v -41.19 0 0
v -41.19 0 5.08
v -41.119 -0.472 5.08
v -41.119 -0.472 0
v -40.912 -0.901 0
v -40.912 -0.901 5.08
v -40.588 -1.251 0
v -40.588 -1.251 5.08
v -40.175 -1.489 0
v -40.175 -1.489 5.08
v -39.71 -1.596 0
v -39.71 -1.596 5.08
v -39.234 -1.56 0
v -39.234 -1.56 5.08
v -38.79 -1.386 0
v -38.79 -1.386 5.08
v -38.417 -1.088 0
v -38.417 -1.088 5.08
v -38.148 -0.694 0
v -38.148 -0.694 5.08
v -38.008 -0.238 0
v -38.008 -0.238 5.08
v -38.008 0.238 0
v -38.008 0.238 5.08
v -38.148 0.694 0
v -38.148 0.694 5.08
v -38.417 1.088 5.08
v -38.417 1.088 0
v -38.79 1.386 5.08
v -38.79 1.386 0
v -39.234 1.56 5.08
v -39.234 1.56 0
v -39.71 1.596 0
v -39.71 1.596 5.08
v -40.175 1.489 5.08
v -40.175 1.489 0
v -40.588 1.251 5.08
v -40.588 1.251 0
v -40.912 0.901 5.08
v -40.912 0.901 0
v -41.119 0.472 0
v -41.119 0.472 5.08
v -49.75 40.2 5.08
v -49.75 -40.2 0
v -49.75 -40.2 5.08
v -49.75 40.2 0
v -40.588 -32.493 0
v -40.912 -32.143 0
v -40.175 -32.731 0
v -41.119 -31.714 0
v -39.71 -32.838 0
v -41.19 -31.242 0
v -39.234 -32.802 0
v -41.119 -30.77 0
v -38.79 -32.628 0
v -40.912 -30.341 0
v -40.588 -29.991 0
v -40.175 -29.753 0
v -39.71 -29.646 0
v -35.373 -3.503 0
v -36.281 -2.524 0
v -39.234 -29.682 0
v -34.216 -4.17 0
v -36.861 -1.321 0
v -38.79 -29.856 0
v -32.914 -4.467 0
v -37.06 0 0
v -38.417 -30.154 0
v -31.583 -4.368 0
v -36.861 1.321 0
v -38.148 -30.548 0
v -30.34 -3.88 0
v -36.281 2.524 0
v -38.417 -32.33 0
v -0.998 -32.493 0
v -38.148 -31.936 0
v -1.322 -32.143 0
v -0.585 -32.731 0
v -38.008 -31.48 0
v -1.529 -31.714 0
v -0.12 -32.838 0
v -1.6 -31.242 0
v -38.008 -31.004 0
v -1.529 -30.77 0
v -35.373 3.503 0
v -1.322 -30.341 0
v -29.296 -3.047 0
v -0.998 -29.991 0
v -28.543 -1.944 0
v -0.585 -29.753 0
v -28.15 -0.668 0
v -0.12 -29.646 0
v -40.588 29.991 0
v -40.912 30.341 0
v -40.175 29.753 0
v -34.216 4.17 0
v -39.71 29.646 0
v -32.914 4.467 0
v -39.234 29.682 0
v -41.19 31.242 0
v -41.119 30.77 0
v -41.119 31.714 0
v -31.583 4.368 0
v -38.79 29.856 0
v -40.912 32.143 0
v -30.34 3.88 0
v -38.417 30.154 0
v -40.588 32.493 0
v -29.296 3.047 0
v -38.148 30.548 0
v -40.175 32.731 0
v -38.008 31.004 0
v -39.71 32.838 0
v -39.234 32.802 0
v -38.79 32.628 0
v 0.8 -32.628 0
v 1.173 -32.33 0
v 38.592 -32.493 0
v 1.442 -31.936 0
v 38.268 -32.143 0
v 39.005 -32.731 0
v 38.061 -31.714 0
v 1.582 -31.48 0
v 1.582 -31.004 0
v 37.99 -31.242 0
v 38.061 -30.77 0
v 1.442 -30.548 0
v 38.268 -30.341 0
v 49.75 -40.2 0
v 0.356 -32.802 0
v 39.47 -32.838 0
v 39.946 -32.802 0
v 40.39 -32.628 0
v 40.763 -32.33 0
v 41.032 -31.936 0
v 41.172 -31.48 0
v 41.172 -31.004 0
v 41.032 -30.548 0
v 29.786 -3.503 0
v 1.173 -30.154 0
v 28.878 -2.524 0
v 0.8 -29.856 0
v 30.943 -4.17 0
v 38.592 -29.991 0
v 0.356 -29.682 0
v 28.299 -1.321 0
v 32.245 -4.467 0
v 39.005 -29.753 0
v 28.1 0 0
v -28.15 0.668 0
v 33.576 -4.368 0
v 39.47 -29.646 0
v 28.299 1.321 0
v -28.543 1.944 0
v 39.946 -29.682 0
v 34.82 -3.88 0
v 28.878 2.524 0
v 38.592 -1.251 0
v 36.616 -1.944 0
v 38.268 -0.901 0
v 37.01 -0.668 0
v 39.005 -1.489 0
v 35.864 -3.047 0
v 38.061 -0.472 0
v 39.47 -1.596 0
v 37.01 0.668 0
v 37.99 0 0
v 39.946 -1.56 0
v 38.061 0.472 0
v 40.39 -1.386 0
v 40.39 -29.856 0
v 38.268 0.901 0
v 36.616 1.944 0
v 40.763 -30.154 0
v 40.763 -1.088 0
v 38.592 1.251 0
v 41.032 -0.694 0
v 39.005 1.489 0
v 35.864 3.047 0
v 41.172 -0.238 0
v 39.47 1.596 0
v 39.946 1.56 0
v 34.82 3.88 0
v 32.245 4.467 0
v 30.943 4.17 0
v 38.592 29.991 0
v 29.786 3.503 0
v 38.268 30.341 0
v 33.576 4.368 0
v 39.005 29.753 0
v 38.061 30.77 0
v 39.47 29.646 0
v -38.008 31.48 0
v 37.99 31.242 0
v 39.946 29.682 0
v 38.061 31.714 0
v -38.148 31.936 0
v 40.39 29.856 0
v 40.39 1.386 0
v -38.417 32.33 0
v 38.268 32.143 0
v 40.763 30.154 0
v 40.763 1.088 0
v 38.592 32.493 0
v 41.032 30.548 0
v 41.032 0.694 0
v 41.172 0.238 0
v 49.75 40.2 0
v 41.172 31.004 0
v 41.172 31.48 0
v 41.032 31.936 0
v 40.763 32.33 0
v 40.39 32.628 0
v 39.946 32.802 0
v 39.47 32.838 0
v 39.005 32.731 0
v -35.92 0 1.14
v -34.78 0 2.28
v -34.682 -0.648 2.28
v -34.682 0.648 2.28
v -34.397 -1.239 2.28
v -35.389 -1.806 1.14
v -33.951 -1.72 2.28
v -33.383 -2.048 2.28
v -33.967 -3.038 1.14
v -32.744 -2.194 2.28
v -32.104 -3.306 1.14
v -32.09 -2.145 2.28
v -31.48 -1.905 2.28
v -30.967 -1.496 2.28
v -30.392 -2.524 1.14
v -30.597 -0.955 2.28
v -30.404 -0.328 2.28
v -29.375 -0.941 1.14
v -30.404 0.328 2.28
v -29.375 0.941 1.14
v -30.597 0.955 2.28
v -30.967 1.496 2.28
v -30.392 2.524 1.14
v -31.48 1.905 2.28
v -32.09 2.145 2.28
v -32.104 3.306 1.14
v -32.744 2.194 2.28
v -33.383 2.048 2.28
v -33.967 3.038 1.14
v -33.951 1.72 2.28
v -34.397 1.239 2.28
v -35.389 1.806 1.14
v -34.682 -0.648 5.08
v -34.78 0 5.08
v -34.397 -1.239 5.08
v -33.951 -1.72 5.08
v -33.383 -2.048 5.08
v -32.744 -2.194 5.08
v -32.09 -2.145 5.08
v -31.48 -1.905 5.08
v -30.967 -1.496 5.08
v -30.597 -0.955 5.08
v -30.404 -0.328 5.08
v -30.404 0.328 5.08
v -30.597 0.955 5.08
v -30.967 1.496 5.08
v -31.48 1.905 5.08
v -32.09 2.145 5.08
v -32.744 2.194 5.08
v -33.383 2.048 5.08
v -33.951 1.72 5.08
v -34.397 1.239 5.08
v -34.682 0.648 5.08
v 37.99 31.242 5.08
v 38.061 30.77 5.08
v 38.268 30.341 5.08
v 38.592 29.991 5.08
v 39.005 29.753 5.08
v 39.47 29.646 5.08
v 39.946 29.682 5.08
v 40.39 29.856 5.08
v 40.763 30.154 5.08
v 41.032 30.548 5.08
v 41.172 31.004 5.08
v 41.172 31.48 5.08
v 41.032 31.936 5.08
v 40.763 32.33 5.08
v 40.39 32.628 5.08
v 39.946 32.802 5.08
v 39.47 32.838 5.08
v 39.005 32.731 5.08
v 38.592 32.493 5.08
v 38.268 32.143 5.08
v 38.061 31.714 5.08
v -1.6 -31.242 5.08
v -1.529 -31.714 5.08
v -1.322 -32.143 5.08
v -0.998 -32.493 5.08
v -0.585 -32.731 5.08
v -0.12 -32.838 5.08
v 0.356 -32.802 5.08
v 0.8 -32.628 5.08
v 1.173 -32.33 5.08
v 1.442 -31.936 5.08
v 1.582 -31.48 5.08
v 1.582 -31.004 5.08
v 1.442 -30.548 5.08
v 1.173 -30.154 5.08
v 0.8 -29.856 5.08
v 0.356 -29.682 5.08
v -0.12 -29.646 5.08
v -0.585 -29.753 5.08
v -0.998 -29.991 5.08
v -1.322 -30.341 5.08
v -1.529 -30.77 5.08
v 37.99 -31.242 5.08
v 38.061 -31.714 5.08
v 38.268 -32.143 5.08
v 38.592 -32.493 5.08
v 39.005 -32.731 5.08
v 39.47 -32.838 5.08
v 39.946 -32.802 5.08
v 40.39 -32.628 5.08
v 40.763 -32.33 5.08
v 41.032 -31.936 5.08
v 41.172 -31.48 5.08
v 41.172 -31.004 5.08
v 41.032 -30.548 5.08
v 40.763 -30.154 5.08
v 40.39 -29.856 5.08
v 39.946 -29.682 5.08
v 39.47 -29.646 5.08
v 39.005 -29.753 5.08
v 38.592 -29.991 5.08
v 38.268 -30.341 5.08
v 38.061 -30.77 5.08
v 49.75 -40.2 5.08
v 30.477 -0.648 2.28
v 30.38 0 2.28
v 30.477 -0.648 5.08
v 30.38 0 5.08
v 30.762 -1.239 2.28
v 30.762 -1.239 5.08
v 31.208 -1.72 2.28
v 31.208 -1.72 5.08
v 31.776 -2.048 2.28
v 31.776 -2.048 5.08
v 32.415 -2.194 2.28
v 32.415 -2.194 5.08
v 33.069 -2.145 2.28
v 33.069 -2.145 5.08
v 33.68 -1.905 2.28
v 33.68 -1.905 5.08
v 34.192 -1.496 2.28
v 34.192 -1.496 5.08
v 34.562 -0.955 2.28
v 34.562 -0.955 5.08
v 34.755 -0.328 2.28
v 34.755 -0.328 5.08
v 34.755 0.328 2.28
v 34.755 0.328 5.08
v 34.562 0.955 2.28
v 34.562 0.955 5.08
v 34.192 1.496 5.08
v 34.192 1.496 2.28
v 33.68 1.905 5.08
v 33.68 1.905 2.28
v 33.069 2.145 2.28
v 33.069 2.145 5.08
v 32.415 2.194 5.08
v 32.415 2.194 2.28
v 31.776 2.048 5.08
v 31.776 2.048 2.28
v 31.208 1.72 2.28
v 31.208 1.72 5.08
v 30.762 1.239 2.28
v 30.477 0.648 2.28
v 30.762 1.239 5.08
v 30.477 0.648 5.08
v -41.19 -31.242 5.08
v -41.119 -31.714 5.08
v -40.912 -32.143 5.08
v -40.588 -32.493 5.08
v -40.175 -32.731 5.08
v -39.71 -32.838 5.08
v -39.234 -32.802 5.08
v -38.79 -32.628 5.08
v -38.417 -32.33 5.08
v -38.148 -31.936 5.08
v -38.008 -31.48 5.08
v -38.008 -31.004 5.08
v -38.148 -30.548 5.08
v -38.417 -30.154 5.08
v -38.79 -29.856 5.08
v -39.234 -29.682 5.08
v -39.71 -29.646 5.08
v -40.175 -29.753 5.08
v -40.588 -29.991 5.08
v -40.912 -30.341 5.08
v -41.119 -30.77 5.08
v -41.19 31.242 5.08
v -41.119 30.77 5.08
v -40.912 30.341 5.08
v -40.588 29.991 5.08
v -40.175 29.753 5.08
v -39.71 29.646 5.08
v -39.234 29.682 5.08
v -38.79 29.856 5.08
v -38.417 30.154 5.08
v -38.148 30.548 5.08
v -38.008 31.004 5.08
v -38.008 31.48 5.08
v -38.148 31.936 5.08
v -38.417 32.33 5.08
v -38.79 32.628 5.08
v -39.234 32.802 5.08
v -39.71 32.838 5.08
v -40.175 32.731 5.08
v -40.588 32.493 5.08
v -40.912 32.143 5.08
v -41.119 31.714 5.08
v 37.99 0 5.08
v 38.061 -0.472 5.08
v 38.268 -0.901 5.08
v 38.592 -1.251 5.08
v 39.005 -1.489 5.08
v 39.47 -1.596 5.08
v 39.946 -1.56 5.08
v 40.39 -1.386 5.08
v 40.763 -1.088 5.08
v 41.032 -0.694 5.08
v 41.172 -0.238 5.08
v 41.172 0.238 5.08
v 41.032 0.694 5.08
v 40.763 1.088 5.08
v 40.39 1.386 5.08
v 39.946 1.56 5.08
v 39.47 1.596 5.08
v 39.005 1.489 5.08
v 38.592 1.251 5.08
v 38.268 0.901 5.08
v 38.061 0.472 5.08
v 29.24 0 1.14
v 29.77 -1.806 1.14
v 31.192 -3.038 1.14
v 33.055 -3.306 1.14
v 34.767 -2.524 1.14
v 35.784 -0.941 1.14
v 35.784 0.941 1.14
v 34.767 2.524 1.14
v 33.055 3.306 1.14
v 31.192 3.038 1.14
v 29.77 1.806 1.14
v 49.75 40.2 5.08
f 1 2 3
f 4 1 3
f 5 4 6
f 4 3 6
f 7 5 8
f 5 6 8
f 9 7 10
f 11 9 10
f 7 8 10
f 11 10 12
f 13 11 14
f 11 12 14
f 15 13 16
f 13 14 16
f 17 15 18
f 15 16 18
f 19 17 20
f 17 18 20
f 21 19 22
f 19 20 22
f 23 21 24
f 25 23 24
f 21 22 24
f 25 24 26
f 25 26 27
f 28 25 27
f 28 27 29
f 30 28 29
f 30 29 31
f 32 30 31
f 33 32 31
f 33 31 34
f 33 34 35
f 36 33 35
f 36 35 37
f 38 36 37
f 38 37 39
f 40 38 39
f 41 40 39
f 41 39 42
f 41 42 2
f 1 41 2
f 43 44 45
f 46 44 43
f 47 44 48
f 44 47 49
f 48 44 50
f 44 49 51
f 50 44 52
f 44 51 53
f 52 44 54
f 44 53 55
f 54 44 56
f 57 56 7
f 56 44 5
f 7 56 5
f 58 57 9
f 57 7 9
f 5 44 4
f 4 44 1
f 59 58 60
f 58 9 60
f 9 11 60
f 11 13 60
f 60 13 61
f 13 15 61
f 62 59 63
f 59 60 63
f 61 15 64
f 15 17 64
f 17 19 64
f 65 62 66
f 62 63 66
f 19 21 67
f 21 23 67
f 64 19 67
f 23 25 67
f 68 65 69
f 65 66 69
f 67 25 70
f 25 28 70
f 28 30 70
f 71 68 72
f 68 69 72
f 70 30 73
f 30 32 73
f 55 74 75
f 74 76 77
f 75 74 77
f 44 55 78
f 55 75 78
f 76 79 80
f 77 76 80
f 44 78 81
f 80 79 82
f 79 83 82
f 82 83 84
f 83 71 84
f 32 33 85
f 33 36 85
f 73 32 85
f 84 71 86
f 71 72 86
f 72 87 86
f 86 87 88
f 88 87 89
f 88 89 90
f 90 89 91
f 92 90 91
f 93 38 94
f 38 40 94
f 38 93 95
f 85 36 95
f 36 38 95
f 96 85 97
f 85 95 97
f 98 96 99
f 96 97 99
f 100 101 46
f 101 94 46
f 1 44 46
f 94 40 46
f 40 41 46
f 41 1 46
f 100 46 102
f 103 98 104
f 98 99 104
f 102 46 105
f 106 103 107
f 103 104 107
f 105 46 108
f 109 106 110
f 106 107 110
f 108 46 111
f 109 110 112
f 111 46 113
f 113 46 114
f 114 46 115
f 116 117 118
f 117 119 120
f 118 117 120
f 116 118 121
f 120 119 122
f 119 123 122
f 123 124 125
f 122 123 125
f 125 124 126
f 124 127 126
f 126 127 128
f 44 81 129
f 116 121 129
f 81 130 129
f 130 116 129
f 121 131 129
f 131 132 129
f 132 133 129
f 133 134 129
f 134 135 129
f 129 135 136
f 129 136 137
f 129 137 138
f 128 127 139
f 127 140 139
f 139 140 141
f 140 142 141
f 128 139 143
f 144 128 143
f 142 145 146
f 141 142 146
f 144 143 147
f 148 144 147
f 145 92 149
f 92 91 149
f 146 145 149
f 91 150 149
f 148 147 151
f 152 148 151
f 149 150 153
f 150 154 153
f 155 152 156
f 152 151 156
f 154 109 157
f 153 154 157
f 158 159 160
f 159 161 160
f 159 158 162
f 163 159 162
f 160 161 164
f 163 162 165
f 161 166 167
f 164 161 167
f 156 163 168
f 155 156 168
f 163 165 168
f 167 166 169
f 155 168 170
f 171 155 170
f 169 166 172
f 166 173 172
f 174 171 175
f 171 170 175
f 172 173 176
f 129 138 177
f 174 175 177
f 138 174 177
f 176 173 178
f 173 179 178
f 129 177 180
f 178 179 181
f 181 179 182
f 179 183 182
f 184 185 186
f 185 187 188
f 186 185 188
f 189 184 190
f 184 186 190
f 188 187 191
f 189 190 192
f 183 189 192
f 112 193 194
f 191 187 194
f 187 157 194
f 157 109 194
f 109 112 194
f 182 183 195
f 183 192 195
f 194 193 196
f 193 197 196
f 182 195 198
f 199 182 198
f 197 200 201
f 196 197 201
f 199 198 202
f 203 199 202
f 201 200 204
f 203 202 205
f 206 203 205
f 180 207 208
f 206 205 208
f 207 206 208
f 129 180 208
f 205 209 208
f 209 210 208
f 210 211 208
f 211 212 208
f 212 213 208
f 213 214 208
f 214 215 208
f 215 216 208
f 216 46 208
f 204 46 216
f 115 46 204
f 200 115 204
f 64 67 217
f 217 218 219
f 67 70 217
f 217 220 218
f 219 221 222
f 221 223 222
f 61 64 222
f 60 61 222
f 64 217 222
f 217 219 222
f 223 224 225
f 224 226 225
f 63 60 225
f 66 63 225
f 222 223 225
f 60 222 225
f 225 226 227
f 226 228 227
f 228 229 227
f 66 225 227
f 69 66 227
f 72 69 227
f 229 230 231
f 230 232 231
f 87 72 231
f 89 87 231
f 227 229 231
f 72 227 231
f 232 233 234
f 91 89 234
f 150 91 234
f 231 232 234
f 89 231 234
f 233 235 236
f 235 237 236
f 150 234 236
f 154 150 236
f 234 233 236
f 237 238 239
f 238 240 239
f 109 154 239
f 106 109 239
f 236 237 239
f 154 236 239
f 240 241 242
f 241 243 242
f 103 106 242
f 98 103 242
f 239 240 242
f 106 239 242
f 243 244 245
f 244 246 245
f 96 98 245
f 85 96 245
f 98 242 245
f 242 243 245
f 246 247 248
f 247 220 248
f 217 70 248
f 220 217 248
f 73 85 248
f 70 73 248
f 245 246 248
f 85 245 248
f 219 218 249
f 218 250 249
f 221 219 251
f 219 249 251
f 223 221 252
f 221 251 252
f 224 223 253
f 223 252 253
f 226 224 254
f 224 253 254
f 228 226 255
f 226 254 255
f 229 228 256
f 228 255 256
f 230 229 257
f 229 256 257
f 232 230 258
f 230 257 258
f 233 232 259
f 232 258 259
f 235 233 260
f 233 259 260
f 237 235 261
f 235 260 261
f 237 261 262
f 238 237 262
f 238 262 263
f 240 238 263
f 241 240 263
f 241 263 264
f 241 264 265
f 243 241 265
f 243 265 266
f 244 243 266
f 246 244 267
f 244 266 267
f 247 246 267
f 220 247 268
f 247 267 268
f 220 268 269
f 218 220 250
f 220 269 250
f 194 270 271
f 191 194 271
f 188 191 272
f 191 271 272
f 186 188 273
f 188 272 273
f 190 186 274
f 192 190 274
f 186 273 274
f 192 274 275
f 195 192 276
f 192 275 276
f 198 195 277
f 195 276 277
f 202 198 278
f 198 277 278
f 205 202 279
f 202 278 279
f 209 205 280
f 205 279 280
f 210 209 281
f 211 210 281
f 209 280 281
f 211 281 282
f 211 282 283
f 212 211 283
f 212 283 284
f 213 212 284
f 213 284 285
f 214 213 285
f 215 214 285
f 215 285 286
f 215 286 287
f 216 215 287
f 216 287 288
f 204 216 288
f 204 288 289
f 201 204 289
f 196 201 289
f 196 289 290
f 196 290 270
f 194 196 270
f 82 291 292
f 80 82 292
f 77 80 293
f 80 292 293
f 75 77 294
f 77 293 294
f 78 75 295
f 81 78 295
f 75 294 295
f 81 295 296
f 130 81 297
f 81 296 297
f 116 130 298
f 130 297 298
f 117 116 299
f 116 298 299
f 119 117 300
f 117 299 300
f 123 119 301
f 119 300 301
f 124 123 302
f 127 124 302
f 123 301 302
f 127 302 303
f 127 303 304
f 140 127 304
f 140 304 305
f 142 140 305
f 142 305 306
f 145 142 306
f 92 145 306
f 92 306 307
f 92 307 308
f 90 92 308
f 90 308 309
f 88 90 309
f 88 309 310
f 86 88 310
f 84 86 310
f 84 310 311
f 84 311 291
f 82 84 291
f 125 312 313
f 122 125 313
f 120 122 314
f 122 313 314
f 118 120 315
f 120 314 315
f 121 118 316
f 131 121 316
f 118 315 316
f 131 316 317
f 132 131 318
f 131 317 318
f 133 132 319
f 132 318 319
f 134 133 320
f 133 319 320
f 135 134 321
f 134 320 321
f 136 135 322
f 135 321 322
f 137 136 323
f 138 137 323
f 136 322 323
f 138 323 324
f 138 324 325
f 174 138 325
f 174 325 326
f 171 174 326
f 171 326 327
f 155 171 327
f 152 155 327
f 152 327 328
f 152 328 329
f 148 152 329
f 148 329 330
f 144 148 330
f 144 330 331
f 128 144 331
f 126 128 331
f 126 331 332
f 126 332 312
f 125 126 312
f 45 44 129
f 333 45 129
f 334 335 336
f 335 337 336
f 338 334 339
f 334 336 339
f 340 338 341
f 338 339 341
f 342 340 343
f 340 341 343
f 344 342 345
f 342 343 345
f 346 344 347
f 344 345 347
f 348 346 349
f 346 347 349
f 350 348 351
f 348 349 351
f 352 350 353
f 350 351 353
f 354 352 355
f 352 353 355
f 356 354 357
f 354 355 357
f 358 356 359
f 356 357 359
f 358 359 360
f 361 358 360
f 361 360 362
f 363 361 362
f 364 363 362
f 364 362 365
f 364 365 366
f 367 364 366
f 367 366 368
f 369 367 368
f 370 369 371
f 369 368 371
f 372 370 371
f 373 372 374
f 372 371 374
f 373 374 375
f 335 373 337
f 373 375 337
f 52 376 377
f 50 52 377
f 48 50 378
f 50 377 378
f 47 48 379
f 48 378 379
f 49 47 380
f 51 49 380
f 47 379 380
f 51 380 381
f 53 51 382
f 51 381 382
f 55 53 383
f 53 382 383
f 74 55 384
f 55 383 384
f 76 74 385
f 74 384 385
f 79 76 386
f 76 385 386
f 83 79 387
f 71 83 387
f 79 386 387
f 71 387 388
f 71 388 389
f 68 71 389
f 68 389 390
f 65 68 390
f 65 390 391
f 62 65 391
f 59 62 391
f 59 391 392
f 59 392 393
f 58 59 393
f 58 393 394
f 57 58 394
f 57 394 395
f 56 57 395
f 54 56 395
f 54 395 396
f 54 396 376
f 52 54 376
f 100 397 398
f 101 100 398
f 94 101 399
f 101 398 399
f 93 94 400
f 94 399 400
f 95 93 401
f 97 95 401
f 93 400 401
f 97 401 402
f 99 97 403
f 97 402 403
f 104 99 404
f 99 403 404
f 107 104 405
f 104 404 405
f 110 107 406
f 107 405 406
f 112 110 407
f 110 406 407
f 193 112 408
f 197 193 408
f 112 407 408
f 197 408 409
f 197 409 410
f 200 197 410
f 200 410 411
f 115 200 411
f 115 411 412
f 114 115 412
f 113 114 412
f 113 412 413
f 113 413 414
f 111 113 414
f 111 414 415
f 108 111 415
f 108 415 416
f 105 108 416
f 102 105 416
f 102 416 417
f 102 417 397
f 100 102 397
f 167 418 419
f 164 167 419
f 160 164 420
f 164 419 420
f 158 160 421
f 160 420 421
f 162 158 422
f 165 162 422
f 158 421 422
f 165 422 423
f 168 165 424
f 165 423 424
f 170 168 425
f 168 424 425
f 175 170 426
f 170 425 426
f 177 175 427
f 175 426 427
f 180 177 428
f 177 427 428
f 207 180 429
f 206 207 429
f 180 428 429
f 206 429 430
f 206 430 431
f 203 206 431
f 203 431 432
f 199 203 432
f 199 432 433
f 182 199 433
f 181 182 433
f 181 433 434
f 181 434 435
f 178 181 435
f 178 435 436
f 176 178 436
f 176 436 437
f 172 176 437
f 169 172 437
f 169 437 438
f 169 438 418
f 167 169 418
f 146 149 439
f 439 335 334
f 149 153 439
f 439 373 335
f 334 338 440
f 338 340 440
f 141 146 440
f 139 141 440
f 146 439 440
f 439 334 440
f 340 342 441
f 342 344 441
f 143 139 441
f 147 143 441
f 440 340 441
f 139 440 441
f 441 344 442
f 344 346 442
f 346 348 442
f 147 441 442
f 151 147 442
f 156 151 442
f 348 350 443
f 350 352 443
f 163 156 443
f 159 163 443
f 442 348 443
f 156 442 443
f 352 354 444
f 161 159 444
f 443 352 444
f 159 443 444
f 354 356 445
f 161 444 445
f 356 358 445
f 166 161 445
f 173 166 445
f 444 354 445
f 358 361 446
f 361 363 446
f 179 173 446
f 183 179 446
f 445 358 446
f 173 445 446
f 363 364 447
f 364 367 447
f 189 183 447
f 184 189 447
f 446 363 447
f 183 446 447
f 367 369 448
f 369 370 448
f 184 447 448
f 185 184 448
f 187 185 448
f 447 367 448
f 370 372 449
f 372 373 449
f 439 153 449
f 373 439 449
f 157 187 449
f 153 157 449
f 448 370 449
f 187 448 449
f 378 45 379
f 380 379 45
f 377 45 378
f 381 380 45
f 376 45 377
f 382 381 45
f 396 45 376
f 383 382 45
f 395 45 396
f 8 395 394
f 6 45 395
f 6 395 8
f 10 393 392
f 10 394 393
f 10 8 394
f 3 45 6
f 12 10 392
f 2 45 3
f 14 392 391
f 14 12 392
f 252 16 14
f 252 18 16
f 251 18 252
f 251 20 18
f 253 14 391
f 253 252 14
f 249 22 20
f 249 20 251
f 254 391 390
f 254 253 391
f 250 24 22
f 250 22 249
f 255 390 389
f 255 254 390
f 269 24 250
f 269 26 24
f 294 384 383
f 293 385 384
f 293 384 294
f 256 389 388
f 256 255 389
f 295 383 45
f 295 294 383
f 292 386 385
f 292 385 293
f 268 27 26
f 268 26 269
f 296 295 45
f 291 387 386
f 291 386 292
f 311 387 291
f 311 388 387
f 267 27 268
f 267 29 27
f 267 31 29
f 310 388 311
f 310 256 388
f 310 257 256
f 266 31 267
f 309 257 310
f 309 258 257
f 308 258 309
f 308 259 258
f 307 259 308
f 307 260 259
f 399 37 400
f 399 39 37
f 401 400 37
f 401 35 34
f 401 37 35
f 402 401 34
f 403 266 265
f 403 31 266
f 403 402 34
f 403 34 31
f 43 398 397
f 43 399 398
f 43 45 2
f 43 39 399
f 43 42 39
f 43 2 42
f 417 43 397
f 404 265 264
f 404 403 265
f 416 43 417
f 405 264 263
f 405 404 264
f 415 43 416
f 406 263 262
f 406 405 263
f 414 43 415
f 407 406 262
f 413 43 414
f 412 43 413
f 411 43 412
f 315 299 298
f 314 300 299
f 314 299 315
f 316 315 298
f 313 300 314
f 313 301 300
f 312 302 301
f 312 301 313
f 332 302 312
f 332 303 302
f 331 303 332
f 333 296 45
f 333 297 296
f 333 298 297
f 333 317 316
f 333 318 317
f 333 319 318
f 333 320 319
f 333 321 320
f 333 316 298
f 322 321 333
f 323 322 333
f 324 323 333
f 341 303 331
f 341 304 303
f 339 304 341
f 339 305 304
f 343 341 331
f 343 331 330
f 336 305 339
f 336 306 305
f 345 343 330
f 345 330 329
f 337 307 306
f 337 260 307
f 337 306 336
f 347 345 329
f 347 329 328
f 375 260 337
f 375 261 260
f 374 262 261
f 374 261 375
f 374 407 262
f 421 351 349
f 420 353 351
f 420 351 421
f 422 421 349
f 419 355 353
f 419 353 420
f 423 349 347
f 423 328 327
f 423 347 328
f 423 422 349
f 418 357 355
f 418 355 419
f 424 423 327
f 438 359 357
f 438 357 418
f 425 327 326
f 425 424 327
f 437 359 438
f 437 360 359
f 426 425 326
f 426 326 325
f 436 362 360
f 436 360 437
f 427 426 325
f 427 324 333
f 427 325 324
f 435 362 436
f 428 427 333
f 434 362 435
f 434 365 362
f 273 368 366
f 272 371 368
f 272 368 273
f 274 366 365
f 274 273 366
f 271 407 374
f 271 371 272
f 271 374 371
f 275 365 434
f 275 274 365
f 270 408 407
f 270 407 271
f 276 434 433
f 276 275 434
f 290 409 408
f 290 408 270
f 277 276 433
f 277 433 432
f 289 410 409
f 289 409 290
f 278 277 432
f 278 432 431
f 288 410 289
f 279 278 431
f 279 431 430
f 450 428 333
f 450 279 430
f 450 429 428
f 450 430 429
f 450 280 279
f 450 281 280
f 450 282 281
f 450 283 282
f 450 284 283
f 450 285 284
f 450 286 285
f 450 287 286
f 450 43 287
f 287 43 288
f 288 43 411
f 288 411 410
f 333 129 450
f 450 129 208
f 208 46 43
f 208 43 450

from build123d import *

# Parameters (mm, degrees)
F0_W           = 99.5
F0_H           = 80.4
F1_DEPTH       = 5.08
F3_D           = 4.4
F3_DEPTH       = 38.1
F3_CSINK_D     = 8.96
F3_CSINK_ANGLE = 90
F3_TIP         = 1.3218933619
F5_D           = 3.2
F5_DEPTH       = 37.175
F5_TIP         = 0.9613769904


# Not quite as in the source:
# - a feature names something its author has since deleted; it is built from what else it names


with BuildPart() as f1:
    # F0 (on Top) → F1 (new body)
    with BuildSketch(Plane.XY):
        Rectangle(F0_W, F0_H)
    extrude(amount=F1_DEPTH)

    # F3
    with Locations(Plane(origin=(0, 0, 0), x_dir=(1, 0, 0), z_dir=(0, 0, -1))):
        with Locations((-32.5796, 0), (32.5796, 0)):
            CounterSinkHole(F3_D / 2, F3_CSINK_D / 2, depth=F3_DEPTH, counter_sink_angle=F3_CSINK_ANGLE)
            with Locations((0, 0, -(F3_DEPTH + F3_TIP / 2))):  # 118° drill point
                Cone(0, F3_D / 2, F3_TIP, mode=Mode.SUBTRACT)

    # F5
    with Locations(Plane(origin=(0, 0, 0), x_dir=(1, 0, 0), z_dir=(0, 0, -1))):
        with Locations((-39.59, 31.242), (-39.59, 0), (-39.59, -31.242), (39.59, -31.242), (39.59, 0), (39.59, 31.242), (0, 31.242)):
            Hole(F5_D / 2, depth=F5_DEPTH)
            with Locations((0, 0, -(F5_DEPTH + F5_TIP / 2))):  # 118° drill point
                Cone(0, F5_D / 2, F5_TIP, mode=Mode.SUBTRACT)


solid = f1.part
